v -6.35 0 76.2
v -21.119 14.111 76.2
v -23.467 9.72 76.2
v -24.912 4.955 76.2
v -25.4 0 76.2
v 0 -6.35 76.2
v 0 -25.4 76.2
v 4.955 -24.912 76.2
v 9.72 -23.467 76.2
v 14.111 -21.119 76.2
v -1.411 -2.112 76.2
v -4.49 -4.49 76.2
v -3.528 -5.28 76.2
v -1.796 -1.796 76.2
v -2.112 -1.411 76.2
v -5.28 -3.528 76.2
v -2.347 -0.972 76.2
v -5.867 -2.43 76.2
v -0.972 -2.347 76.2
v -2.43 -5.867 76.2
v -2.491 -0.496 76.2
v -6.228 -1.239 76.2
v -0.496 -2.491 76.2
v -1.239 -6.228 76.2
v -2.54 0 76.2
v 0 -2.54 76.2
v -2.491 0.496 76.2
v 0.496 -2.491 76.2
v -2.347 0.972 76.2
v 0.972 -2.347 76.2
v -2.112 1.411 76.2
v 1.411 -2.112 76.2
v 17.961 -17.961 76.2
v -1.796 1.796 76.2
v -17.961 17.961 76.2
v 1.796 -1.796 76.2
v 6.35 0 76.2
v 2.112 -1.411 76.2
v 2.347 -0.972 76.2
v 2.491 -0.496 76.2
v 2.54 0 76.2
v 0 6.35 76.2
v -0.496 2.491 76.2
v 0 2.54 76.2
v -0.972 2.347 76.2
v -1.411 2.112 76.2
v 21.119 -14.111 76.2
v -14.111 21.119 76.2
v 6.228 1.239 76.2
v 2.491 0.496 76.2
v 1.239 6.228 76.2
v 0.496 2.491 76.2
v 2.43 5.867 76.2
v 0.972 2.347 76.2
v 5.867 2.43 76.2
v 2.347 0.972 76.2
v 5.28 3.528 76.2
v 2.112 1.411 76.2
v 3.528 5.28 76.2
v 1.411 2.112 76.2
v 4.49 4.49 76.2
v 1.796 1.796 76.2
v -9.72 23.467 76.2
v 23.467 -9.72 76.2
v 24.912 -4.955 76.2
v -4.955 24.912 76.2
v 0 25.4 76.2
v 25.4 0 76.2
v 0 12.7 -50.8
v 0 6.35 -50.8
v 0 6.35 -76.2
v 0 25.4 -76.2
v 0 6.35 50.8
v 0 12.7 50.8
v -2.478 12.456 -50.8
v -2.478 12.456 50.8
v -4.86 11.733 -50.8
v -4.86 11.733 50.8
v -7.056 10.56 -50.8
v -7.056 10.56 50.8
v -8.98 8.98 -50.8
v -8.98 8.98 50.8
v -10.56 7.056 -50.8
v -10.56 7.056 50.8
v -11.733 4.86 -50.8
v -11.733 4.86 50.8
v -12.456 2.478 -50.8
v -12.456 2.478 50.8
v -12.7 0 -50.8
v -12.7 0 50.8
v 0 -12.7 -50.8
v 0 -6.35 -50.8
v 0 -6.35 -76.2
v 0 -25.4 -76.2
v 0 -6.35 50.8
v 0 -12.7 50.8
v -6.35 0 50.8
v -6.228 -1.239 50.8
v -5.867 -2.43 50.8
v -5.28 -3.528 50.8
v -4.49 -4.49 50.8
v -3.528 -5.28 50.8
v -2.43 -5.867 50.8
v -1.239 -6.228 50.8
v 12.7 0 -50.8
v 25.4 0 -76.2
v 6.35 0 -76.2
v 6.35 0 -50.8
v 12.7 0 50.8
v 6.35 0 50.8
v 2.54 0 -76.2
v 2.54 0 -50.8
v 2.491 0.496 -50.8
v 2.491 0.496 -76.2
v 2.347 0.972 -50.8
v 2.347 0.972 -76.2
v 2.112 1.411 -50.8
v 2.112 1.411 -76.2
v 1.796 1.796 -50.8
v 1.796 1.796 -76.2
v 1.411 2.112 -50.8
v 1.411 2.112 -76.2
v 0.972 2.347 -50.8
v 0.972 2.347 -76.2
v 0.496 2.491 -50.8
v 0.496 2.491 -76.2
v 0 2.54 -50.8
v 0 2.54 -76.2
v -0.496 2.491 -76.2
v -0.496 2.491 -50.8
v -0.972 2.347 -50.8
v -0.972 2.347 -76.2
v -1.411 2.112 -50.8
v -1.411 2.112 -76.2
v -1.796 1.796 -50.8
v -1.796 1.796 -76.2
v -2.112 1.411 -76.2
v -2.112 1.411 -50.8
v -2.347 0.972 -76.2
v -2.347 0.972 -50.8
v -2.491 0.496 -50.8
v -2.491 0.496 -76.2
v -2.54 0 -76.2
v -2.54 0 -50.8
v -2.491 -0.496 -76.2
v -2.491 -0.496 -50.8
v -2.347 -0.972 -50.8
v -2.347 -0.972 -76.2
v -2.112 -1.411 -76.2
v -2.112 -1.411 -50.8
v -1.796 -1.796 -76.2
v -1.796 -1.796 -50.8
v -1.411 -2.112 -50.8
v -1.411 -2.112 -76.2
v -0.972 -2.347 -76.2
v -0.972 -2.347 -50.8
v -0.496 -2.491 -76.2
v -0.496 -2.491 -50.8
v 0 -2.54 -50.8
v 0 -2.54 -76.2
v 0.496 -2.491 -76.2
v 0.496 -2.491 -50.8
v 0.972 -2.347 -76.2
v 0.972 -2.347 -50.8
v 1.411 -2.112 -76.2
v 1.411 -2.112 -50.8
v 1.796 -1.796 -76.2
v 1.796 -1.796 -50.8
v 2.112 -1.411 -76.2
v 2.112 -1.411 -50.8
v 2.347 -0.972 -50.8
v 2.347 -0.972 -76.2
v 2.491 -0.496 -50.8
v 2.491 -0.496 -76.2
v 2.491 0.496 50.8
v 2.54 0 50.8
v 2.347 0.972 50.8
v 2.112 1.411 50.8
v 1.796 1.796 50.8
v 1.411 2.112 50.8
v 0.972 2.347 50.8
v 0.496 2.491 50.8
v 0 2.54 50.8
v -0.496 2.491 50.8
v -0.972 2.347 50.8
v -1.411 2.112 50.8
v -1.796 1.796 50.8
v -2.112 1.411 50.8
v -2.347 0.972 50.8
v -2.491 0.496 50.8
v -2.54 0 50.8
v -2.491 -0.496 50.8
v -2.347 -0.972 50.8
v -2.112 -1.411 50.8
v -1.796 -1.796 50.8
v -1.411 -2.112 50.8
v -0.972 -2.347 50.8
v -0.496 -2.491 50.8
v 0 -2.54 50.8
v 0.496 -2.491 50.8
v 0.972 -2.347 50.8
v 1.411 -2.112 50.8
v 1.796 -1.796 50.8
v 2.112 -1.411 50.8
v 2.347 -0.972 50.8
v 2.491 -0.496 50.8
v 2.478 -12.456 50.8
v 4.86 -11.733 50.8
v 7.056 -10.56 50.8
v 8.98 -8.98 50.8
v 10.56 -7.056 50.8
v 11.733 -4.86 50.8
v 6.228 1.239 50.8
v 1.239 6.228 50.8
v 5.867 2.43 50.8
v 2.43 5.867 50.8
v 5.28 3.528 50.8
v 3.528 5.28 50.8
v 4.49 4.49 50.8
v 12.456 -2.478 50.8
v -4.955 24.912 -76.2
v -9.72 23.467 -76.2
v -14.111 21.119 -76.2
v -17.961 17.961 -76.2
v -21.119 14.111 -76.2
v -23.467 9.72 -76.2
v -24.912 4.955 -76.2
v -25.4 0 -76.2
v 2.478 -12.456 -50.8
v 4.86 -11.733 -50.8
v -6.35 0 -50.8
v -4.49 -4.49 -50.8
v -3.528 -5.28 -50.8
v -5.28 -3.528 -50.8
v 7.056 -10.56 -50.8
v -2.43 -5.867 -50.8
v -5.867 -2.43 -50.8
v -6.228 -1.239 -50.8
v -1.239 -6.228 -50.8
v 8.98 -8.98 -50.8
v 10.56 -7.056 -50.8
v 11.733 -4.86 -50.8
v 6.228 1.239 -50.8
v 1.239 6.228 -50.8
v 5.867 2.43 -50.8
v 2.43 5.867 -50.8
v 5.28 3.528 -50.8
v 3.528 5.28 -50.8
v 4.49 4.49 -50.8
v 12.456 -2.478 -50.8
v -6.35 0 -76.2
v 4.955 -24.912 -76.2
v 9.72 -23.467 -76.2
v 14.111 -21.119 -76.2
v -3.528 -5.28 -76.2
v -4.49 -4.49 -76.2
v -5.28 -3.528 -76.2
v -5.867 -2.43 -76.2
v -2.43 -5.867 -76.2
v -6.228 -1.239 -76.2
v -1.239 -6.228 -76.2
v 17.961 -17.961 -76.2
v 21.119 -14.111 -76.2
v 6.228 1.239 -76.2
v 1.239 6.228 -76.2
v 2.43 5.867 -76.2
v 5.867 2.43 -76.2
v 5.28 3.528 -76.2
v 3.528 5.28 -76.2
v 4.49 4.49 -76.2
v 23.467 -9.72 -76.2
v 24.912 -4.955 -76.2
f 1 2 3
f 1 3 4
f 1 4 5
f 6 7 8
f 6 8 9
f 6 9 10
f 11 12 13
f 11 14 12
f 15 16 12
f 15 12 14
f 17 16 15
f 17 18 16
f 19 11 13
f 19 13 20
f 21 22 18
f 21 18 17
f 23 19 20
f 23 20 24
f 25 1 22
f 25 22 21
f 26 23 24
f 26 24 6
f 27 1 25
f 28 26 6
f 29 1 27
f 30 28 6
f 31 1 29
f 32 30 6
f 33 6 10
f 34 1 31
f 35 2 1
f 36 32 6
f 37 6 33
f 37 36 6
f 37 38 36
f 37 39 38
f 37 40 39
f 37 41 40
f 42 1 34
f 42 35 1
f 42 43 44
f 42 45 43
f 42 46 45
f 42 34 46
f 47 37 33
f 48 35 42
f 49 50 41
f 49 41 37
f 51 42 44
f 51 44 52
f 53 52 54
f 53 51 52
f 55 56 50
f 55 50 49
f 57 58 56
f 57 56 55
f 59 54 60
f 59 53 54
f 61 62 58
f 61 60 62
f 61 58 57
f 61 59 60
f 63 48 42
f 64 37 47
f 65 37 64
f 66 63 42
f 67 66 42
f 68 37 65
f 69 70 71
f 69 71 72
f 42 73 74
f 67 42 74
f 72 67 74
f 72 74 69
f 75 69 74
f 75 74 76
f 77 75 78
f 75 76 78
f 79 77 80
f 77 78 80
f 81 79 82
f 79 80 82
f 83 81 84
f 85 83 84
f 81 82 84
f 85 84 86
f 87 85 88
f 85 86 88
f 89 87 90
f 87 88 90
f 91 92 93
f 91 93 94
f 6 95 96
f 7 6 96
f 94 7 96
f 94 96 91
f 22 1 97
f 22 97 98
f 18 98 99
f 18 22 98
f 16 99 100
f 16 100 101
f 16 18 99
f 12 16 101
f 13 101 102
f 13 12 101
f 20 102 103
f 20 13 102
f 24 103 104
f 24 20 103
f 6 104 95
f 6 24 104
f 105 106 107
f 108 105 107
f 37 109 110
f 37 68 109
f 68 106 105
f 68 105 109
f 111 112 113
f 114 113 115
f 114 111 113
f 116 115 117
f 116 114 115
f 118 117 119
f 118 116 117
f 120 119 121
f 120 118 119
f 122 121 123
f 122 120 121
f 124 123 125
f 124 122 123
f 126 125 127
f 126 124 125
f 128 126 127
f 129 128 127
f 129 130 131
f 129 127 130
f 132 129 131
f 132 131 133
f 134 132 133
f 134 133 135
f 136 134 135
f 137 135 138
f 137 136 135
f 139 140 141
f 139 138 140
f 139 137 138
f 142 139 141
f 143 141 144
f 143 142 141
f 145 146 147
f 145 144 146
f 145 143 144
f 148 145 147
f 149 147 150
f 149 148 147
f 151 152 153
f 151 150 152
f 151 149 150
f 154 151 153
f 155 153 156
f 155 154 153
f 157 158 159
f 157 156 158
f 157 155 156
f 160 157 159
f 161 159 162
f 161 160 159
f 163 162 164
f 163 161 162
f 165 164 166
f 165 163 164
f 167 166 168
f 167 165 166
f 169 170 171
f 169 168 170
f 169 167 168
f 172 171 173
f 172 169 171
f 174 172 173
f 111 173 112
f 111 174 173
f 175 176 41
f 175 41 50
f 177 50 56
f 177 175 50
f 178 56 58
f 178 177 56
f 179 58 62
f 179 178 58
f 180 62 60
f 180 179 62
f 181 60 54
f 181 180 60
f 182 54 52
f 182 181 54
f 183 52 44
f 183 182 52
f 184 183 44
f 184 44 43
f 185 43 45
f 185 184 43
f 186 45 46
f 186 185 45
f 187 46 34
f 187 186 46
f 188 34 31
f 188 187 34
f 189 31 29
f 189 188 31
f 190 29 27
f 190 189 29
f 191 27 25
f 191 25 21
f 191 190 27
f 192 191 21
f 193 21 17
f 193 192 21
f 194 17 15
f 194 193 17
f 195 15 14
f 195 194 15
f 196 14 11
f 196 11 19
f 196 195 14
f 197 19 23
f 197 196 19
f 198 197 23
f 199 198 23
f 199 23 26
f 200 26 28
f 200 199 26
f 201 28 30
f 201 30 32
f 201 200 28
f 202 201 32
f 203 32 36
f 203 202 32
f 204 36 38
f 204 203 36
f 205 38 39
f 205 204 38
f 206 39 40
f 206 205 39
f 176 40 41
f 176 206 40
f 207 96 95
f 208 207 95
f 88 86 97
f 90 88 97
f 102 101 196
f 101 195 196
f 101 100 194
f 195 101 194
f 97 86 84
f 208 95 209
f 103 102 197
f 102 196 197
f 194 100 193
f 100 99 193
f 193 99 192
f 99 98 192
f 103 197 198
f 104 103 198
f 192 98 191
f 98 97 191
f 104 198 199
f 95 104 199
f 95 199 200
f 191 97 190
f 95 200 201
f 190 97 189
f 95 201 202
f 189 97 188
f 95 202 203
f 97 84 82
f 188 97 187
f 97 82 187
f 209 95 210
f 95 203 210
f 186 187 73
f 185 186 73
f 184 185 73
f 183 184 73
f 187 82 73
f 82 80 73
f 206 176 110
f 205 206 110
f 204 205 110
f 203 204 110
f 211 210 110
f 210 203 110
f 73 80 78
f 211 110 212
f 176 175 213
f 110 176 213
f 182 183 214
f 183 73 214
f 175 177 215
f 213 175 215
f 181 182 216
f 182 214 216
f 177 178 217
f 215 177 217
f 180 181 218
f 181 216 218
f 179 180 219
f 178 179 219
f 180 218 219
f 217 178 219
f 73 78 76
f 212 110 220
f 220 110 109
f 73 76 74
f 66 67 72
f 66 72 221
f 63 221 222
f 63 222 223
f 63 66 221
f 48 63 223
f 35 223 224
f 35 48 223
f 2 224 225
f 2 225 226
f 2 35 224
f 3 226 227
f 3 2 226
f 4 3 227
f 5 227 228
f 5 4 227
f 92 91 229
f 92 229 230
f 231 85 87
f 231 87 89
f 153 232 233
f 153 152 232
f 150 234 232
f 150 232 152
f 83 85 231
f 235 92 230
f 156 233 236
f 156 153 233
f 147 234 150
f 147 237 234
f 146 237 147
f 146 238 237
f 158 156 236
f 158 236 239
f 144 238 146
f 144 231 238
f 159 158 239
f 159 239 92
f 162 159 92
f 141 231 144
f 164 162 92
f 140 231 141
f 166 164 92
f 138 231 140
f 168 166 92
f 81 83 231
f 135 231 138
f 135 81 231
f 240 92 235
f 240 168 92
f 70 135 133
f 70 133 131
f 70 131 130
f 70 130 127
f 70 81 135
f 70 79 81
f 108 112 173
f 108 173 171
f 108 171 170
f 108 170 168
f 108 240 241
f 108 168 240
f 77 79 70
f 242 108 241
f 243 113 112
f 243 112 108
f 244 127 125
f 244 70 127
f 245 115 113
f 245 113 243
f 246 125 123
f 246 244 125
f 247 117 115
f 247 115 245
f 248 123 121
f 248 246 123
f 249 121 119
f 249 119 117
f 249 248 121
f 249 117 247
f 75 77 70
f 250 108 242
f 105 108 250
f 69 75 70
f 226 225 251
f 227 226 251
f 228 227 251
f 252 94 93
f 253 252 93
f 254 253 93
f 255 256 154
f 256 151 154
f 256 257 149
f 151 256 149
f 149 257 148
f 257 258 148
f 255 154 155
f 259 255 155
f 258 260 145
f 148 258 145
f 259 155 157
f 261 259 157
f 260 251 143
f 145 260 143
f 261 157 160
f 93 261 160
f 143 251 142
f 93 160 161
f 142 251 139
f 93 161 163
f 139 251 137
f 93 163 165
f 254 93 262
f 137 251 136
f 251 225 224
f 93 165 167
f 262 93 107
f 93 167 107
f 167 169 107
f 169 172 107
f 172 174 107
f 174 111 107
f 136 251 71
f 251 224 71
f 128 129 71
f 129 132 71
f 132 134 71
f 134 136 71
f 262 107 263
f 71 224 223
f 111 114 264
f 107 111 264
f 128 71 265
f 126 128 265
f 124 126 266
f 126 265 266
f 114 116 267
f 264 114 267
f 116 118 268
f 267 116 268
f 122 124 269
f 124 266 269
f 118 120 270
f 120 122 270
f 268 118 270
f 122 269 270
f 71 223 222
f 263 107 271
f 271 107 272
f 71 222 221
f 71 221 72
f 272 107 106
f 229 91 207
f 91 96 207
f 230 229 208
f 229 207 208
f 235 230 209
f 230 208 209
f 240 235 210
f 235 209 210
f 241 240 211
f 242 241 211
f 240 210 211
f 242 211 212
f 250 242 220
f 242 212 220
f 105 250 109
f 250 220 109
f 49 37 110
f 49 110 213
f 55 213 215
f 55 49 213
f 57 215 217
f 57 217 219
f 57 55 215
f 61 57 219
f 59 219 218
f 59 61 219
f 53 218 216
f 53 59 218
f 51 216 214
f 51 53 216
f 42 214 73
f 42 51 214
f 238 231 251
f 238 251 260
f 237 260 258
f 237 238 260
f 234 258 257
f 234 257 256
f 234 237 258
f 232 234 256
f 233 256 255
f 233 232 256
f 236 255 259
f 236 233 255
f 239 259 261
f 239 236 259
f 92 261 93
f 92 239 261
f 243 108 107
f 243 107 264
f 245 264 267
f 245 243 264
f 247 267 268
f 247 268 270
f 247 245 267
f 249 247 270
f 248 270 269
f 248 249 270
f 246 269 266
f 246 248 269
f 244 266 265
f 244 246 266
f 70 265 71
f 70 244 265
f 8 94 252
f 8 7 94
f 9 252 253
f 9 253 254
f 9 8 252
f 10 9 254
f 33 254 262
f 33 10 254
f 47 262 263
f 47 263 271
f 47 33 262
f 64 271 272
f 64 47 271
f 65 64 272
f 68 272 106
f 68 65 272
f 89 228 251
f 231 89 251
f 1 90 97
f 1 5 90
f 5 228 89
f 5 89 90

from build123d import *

# Parameters (mm, degrees)
F0_R     = 2.54
F1_DEPTH = 76.2
F3_R     = 12.7
F4_DEPTH = 50.8


with BuildPart() as f1:
    # F0 (on Top) → F1 (new body, symmetric)
    with BuildSketch(Plane.XY):
        with BuildLine():
            Line((0, 6.35), (0, 25.4))
            ThreePointArc((0, 25.4), (-17.960512, 17.960512), (-25.4, 0))
            Line((-25.4, 0), (-6.35, 0))
            ThreePointArc((-6.35, 0), (-4.490128, -4.490128), (0, -6.35))
            Line((0, -6.35), (0, -25.4))
            ThreePointArc((0, -25.4), (17.960512, -17.960512), (25.4, 0))
            Line((25.4, 0), (6.35, 0))
            ThreePointArc((6.35, 0), (4.490128, 4.490128), (0, 6.35))
        make_face()
        Circle(F0_R, mode=Mode.SUBTRACT)
    extrude(amount=F1_DEPTH, both=True)

    # F3 (on Top) → F4 (cut, symmetric)
    with BuildSketch(Plane.XY):
        Circle(F3_R)
    extrude(amount=F4_DEPTH, both=True, mode=Mode.SUBTRACT)


solid = f1.part
